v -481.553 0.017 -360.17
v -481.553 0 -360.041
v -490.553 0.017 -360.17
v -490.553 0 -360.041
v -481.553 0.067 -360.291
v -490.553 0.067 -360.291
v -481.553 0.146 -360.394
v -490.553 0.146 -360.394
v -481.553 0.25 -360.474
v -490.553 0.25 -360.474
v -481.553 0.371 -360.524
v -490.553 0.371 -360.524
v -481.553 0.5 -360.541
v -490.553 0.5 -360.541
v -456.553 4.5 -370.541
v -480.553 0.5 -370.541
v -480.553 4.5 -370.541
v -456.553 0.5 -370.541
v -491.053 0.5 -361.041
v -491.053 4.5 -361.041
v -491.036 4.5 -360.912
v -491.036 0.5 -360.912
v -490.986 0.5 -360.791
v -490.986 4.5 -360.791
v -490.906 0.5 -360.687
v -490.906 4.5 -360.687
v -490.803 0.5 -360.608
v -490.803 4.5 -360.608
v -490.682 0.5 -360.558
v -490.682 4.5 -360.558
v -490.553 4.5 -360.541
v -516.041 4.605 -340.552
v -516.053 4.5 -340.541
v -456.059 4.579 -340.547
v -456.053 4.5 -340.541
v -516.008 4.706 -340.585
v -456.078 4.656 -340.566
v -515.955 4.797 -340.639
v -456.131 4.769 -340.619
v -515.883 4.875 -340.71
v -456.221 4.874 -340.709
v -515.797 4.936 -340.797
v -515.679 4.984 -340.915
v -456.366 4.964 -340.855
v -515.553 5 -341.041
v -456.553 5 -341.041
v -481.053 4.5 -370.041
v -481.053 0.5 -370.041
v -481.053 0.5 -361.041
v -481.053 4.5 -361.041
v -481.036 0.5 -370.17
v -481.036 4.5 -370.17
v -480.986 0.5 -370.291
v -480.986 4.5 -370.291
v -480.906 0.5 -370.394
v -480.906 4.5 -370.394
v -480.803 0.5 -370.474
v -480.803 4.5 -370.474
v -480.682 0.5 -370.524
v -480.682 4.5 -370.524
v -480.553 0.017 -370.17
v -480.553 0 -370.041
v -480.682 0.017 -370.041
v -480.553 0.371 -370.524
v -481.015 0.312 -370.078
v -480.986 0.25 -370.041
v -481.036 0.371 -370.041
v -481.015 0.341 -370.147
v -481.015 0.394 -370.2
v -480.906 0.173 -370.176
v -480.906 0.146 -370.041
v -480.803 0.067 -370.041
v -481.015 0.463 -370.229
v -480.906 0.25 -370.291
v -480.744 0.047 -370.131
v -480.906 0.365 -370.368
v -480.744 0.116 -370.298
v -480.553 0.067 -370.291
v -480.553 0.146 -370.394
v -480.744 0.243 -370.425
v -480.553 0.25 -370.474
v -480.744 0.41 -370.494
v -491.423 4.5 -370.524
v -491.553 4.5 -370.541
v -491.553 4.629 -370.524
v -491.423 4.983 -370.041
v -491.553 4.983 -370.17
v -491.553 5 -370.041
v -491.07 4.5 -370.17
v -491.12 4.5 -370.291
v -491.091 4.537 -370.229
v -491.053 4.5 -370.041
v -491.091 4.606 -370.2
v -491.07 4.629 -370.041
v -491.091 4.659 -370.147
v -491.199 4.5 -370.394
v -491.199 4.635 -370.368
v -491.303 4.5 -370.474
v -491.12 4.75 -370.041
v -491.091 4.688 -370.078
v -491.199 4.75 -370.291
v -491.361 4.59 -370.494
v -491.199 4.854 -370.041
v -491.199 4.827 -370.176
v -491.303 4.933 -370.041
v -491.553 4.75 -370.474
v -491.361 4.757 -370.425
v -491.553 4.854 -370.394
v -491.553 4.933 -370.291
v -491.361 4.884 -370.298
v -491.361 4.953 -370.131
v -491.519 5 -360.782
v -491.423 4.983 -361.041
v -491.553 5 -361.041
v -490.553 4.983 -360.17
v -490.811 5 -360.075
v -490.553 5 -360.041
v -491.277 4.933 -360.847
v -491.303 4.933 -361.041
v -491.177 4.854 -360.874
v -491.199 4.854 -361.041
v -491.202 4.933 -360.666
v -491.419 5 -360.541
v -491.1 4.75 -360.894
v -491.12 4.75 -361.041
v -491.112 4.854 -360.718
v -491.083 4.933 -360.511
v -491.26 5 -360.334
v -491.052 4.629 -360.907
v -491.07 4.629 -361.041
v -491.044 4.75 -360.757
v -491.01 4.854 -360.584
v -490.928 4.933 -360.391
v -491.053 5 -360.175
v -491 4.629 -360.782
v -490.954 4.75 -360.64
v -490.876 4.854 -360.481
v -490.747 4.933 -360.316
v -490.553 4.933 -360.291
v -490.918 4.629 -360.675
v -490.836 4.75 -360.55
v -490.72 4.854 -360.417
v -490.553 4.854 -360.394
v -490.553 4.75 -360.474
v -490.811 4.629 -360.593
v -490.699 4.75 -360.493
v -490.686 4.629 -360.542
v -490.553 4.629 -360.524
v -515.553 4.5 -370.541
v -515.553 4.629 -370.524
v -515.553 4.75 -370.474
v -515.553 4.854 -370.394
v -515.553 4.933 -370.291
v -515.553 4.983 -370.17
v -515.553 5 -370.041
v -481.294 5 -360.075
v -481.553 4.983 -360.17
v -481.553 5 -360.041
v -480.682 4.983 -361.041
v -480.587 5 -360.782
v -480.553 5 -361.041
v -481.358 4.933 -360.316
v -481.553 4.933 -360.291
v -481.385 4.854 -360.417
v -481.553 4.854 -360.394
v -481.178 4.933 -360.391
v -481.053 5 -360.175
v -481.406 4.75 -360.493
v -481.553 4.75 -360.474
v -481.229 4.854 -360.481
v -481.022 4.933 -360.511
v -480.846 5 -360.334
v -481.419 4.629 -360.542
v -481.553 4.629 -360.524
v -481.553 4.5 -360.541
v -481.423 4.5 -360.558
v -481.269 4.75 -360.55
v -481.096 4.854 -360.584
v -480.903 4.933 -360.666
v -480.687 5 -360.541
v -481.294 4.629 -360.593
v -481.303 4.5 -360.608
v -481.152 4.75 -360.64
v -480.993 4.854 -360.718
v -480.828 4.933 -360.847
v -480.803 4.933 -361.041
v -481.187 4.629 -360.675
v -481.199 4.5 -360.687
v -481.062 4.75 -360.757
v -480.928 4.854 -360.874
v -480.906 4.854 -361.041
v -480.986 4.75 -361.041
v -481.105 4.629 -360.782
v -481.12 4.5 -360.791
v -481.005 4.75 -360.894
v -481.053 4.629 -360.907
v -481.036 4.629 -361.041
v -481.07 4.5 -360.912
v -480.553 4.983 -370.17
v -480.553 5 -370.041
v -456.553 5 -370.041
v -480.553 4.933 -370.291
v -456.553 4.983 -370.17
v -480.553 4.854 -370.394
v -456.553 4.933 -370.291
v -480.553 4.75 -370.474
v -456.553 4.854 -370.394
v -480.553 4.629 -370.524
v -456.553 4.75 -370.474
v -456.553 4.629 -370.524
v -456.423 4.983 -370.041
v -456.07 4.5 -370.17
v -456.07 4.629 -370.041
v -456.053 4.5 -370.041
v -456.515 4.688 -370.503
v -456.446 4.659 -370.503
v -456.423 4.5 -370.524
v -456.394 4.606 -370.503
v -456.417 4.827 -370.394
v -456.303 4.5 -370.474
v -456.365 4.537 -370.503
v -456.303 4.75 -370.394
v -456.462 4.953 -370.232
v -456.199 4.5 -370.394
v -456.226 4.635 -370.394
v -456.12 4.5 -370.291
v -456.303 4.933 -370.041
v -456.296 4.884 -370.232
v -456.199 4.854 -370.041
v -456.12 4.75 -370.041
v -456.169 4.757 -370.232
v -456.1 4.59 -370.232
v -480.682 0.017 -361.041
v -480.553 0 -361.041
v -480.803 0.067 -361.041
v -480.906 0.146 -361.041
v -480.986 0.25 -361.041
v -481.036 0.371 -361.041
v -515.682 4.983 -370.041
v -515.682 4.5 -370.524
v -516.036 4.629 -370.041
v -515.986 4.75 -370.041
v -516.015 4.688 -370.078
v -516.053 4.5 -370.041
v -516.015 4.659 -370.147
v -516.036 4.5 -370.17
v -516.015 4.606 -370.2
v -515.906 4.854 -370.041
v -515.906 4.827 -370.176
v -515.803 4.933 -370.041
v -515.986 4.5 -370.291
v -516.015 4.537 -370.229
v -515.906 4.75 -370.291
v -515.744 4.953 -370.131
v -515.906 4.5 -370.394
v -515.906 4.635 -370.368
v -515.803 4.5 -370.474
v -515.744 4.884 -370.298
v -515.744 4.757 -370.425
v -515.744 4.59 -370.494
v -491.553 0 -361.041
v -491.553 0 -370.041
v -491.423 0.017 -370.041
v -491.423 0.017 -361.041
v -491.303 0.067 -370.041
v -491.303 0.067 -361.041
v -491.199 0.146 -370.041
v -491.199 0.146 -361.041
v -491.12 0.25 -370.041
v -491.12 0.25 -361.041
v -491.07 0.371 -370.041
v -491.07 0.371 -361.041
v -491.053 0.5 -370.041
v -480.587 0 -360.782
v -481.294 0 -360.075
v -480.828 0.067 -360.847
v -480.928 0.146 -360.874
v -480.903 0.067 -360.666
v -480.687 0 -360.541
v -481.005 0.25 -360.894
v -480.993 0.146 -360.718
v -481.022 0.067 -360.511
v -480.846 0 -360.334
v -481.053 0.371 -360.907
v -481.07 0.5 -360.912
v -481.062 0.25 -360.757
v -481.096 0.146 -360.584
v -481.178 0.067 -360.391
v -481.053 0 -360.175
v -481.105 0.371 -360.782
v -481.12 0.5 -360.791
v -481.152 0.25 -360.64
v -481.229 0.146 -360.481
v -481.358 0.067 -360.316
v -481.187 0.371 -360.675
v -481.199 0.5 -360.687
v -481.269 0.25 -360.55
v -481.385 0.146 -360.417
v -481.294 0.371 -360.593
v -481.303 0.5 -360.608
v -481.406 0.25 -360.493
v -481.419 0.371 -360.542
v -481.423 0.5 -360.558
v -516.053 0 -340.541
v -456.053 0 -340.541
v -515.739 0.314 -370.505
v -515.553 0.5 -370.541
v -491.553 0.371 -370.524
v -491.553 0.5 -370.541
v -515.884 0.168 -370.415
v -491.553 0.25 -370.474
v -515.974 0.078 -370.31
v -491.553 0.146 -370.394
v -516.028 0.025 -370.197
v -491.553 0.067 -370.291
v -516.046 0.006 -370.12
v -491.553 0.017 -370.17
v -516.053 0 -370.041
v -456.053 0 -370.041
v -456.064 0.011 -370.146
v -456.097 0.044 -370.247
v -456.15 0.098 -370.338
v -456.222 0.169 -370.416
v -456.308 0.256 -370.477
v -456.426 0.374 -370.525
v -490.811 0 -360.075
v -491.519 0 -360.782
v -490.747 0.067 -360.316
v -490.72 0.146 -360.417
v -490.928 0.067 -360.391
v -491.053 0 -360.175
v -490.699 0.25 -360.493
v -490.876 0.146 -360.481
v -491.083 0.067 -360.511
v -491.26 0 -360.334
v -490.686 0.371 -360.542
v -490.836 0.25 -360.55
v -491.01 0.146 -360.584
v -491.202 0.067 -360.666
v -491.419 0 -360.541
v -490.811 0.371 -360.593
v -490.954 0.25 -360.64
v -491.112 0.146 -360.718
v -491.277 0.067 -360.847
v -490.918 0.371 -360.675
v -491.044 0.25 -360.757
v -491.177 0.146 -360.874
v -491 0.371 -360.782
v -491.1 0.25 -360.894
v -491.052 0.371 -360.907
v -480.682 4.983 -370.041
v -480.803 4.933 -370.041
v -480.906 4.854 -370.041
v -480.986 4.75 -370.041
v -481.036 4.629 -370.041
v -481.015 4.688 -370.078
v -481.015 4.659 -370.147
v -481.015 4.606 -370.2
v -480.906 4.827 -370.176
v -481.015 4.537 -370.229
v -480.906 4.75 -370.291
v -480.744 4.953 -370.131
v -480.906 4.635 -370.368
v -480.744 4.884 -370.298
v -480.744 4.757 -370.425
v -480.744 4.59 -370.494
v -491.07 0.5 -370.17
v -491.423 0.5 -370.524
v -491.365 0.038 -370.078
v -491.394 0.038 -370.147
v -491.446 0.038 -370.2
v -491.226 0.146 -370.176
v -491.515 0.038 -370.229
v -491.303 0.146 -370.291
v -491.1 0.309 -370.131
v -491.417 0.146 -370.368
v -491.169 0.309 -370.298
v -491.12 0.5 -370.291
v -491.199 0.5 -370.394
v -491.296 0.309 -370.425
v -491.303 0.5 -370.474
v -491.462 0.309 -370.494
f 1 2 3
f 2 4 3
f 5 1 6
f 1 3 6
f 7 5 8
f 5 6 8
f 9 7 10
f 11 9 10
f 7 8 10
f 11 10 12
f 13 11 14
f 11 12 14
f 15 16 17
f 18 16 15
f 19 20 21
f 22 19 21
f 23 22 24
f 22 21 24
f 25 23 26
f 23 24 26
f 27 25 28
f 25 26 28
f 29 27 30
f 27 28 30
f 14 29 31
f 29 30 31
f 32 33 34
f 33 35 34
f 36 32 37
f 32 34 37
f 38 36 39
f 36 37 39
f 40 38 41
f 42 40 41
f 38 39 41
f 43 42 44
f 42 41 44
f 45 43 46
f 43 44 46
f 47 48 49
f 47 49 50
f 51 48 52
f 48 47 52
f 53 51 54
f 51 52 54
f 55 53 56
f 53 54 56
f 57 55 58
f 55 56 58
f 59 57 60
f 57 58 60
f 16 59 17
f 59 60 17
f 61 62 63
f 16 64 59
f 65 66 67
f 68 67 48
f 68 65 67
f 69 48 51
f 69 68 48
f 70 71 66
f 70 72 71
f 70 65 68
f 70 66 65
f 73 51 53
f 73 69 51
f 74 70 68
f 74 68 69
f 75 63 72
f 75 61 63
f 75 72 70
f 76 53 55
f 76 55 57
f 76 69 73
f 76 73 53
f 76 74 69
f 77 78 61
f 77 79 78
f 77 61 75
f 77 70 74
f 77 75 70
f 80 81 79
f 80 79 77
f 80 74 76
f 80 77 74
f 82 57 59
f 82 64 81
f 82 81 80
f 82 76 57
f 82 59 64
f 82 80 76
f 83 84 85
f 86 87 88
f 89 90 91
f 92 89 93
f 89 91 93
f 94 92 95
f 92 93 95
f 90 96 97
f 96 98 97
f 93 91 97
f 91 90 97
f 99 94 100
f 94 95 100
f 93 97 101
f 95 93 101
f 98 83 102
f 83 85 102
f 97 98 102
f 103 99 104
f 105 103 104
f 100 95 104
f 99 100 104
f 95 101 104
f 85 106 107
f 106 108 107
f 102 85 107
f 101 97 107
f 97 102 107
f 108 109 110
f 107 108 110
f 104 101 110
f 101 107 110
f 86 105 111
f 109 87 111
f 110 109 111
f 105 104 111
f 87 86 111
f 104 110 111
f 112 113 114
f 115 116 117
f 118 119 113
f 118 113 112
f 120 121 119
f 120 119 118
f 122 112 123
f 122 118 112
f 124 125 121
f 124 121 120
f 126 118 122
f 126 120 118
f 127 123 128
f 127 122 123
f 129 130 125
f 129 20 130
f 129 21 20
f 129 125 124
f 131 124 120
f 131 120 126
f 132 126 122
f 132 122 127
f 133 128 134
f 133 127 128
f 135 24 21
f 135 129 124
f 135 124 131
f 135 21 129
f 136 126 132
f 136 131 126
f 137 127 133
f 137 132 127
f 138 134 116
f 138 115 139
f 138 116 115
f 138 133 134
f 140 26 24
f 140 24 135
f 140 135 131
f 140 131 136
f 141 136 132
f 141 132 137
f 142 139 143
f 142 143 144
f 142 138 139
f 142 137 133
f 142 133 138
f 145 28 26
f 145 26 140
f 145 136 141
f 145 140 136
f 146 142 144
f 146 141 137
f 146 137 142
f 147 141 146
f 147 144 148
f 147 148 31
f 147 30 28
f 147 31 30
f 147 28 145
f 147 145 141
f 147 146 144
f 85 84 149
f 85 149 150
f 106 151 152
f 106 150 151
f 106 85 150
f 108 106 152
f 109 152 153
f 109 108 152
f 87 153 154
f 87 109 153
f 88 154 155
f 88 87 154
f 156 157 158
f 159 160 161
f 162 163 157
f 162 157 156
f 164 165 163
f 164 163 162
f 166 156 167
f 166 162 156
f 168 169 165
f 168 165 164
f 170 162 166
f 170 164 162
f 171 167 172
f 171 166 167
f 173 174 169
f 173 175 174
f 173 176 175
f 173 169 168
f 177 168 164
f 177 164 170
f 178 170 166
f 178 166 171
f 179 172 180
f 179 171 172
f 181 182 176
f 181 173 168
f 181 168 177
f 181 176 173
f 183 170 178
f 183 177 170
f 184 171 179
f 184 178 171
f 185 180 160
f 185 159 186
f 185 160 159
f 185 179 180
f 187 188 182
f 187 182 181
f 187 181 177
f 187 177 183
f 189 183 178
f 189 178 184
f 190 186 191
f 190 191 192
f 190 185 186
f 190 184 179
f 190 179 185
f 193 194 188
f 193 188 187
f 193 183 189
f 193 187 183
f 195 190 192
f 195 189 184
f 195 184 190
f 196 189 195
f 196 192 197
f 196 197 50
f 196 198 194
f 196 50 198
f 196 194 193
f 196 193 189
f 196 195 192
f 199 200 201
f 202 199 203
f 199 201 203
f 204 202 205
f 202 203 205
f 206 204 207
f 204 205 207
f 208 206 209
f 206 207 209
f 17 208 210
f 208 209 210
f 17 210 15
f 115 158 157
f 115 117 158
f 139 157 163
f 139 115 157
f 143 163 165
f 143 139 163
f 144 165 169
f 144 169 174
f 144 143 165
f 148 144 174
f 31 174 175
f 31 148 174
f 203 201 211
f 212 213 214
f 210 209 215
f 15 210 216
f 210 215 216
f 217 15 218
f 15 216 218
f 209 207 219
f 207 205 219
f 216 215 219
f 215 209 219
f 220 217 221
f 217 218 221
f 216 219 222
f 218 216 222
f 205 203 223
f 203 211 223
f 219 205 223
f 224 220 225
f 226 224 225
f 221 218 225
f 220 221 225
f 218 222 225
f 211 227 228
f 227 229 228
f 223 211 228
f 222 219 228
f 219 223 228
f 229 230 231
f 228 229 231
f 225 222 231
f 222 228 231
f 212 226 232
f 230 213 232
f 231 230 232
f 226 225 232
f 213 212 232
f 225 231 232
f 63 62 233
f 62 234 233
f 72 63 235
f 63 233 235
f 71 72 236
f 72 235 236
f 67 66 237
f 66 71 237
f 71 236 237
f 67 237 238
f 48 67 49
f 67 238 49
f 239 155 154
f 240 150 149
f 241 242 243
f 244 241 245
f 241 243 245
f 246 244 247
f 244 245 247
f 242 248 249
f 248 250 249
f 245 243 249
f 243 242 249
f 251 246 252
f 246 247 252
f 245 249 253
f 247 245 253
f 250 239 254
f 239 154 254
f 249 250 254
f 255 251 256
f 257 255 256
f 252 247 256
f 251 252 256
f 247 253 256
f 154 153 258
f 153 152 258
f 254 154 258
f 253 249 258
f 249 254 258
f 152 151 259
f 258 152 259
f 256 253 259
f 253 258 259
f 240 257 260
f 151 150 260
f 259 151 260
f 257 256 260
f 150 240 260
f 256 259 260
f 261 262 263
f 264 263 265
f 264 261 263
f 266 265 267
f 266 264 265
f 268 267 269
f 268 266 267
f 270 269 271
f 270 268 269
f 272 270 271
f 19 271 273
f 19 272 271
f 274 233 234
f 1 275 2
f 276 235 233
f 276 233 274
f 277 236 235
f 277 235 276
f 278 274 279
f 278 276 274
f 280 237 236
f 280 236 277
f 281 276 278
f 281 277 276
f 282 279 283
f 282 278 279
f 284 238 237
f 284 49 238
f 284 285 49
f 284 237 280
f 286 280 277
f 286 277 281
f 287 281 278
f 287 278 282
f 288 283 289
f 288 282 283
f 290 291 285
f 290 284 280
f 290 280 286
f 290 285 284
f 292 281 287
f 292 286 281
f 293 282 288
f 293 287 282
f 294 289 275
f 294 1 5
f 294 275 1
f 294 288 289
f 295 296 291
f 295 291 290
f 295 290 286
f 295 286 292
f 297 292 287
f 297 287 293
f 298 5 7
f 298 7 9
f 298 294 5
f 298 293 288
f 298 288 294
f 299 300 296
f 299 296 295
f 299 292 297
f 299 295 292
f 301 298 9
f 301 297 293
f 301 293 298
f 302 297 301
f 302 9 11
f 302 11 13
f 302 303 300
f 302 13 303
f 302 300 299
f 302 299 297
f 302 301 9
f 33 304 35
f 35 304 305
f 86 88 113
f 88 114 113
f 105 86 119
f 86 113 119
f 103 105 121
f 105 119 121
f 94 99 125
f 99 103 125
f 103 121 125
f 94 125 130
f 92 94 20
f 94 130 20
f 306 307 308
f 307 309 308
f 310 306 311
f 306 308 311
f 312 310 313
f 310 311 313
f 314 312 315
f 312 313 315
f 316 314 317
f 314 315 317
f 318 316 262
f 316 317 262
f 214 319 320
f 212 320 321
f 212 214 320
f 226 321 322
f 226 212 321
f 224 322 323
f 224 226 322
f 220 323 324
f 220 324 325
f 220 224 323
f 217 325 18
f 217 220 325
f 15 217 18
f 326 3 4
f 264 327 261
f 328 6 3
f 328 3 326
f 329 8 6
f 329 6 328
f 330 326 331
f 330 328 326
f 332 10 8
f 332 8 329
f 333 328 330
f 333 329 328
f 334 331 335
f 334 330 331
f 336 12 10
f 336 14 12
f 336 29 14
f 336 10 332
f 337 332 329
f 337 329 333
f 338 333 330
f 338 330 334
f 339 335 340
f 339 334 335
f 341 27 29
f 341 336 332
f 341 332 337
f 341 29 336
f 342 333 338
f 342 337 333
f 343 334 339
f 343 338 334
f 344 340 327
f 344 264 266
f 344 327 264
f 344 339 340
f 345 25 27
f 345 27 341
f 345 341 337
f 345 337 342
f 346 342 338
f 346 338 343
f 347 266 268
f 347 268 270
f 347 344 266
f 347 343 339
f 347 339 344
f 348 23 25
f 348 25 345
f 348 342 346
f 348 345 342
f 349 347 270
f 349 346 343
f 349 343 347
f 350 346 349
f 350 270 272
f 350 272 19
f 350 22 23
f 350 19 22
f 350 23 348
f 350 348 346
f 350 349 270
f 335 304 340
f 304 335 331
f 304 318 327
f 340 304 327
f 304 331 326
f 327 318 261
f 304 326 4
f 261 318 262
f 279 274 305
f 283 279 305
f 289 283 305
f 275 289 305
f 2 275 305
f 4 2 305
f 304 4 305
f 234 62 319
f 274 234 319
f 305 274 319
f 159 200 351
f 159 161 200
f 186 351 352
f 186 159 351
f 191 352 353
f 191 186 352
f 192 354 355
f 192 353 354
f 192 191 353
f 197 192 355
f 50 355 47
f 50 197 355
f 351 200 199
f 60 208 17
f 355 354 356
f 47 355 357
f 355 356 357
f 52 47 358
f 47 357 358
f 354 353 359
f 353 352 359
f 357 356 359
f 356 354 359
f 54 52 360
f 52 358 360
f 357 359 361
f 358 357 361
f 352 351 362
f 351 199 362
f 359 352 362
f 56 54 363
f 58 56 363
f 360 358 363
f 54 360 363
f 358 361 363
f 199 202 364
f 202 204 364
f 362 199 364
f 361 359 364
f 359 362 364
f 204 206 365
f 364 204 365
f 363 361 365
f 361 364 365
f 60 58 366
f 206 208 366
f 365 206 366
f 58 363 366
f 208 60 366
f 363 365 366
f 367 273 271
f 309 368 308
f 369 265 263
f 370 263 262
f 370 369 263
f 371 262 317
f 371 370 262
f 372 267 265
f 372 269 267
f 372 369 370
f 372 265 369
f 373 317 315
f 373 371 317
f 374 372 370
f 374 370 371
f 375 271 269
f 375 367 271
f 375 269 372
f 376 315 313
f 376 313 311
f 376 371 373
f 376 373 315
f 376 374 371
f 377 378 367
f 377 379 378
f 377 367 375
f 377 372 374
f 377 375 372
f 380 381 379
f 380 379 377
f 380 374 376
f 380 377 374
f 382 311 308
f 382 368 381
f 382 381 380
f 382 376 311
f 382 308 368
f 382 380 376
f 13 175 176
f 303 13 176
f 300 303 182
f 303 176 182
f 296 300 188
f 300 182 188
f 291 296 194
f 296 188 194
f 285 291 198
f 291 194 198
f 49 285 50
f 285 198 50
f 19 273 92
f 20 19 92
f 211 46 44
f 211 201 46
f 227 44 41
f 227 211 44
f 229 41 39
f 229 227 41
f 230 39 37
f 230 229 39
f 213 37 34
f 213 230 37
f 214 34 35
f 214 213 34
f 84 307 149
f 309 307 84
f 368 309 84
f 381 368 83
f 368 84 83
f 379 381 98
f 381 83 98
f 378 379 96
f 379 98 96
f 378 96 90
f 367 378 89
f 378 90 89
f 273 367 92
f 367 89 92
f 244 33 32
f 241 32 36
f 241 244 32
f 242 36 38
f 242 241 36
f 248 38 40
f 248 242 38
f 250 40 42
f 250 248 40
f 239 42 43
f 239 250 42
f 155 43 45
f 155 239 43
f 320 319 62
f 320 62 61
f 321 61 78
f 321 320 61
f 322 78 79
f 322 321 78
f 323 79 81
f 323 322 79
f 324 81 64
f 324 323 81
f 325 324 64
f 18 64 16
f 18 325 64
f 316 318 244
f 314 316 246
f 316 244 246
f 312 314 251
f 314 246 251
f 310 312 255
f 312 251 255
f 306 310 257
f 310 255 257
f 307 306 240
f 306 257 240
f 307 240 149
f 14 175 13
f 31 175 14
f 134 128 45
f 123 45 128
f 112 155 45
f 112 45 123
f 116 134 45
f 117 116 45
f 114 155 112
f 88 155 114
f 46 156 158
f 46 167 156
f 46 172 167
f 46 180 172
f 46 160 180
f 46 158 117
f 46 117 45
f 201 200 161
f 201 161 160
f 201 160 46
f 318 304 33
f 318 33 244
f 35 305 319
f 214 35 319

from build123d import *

# Parameters (mm, degrees)
SKETCH1_W           = 60
SKETCH1_H           = 30
BOSS_EXTRUDE1_DEPTH = 5
SKETCH2_W           = 10
SKETCH2_H           = 5
CUT_EXTRUDE1_DEPTH  = 10
FILLET1_R           = 0.5


with BuildPart() as part:
    # Sketch1 → Boss-Extrude1 (new body)
    with BuildSketch(Plane(origin=(0, 0, 0), x_dir=(1, 0, 0), z_dir=(0, 1, 0))):
        with Locations((-486.052613816, 355.540919523)):
            Rectangle(SKETCH1_W, SKETCH1_H)
    extrude(amount=BOSS_EXTRUDE1_DEPTH)

    # Sketch2 → Cut-Extrude1 (cut)
    with BuildSketch(Plane(origin=(0, 0, -370.540919523), x_dir=(-1, 0, 0), z_dir=(0, 0, -1))):
        with Locations((486.052613816, 2.5)):
            Rectangle(SKETCH2_W, SKETCH2_H)
    extrude(amount=-CUT_EXTRUDE1_DEPTH, mode=Mode.SUBTRACT)

    # Fillet1
    fillet1_edges = [part.edges().sort_by_distance(p)[0] for p in [
        (-456.052613816, 5, -355.540919523),
        (-503.552613816, 5, -370.540919523),
        (-468.552613816, 0, -370.540919523),
        (-468.552613816, 5, -370.540919523),
        (-481.052613816, 5, -365.540919523),
        (-491.052613816, 2.5, -370.540919523),
        (-491.052613816, 5, -365.540919523),
        (-486.052613816, 0, -360.540919523),
        (-491.052613816, 0, -365.540919523),
        (-481.052613816, 2.5, -360.540919523),
        (-481.052613816, 0, -365.540919523),
        (-486.052613816, 5, -360.540919523),
        (-491.052613816, 2.5, -360.540919523),
        (-481.052613816, 2.5, -370.540919523),
        (-516.052613816, 5, -355.540919523),
        (-503.552613816, 0, -370.540919523),
        (-486.052613816, 5, -340.540919523),
        (-516.052613816, 2.5, -370.540919523),
        (-456.052613816, 2.5, -370.540919523),
    ]]
    fillet(fillet1_edges, radius=FILLET1_R)


solid = part.part
